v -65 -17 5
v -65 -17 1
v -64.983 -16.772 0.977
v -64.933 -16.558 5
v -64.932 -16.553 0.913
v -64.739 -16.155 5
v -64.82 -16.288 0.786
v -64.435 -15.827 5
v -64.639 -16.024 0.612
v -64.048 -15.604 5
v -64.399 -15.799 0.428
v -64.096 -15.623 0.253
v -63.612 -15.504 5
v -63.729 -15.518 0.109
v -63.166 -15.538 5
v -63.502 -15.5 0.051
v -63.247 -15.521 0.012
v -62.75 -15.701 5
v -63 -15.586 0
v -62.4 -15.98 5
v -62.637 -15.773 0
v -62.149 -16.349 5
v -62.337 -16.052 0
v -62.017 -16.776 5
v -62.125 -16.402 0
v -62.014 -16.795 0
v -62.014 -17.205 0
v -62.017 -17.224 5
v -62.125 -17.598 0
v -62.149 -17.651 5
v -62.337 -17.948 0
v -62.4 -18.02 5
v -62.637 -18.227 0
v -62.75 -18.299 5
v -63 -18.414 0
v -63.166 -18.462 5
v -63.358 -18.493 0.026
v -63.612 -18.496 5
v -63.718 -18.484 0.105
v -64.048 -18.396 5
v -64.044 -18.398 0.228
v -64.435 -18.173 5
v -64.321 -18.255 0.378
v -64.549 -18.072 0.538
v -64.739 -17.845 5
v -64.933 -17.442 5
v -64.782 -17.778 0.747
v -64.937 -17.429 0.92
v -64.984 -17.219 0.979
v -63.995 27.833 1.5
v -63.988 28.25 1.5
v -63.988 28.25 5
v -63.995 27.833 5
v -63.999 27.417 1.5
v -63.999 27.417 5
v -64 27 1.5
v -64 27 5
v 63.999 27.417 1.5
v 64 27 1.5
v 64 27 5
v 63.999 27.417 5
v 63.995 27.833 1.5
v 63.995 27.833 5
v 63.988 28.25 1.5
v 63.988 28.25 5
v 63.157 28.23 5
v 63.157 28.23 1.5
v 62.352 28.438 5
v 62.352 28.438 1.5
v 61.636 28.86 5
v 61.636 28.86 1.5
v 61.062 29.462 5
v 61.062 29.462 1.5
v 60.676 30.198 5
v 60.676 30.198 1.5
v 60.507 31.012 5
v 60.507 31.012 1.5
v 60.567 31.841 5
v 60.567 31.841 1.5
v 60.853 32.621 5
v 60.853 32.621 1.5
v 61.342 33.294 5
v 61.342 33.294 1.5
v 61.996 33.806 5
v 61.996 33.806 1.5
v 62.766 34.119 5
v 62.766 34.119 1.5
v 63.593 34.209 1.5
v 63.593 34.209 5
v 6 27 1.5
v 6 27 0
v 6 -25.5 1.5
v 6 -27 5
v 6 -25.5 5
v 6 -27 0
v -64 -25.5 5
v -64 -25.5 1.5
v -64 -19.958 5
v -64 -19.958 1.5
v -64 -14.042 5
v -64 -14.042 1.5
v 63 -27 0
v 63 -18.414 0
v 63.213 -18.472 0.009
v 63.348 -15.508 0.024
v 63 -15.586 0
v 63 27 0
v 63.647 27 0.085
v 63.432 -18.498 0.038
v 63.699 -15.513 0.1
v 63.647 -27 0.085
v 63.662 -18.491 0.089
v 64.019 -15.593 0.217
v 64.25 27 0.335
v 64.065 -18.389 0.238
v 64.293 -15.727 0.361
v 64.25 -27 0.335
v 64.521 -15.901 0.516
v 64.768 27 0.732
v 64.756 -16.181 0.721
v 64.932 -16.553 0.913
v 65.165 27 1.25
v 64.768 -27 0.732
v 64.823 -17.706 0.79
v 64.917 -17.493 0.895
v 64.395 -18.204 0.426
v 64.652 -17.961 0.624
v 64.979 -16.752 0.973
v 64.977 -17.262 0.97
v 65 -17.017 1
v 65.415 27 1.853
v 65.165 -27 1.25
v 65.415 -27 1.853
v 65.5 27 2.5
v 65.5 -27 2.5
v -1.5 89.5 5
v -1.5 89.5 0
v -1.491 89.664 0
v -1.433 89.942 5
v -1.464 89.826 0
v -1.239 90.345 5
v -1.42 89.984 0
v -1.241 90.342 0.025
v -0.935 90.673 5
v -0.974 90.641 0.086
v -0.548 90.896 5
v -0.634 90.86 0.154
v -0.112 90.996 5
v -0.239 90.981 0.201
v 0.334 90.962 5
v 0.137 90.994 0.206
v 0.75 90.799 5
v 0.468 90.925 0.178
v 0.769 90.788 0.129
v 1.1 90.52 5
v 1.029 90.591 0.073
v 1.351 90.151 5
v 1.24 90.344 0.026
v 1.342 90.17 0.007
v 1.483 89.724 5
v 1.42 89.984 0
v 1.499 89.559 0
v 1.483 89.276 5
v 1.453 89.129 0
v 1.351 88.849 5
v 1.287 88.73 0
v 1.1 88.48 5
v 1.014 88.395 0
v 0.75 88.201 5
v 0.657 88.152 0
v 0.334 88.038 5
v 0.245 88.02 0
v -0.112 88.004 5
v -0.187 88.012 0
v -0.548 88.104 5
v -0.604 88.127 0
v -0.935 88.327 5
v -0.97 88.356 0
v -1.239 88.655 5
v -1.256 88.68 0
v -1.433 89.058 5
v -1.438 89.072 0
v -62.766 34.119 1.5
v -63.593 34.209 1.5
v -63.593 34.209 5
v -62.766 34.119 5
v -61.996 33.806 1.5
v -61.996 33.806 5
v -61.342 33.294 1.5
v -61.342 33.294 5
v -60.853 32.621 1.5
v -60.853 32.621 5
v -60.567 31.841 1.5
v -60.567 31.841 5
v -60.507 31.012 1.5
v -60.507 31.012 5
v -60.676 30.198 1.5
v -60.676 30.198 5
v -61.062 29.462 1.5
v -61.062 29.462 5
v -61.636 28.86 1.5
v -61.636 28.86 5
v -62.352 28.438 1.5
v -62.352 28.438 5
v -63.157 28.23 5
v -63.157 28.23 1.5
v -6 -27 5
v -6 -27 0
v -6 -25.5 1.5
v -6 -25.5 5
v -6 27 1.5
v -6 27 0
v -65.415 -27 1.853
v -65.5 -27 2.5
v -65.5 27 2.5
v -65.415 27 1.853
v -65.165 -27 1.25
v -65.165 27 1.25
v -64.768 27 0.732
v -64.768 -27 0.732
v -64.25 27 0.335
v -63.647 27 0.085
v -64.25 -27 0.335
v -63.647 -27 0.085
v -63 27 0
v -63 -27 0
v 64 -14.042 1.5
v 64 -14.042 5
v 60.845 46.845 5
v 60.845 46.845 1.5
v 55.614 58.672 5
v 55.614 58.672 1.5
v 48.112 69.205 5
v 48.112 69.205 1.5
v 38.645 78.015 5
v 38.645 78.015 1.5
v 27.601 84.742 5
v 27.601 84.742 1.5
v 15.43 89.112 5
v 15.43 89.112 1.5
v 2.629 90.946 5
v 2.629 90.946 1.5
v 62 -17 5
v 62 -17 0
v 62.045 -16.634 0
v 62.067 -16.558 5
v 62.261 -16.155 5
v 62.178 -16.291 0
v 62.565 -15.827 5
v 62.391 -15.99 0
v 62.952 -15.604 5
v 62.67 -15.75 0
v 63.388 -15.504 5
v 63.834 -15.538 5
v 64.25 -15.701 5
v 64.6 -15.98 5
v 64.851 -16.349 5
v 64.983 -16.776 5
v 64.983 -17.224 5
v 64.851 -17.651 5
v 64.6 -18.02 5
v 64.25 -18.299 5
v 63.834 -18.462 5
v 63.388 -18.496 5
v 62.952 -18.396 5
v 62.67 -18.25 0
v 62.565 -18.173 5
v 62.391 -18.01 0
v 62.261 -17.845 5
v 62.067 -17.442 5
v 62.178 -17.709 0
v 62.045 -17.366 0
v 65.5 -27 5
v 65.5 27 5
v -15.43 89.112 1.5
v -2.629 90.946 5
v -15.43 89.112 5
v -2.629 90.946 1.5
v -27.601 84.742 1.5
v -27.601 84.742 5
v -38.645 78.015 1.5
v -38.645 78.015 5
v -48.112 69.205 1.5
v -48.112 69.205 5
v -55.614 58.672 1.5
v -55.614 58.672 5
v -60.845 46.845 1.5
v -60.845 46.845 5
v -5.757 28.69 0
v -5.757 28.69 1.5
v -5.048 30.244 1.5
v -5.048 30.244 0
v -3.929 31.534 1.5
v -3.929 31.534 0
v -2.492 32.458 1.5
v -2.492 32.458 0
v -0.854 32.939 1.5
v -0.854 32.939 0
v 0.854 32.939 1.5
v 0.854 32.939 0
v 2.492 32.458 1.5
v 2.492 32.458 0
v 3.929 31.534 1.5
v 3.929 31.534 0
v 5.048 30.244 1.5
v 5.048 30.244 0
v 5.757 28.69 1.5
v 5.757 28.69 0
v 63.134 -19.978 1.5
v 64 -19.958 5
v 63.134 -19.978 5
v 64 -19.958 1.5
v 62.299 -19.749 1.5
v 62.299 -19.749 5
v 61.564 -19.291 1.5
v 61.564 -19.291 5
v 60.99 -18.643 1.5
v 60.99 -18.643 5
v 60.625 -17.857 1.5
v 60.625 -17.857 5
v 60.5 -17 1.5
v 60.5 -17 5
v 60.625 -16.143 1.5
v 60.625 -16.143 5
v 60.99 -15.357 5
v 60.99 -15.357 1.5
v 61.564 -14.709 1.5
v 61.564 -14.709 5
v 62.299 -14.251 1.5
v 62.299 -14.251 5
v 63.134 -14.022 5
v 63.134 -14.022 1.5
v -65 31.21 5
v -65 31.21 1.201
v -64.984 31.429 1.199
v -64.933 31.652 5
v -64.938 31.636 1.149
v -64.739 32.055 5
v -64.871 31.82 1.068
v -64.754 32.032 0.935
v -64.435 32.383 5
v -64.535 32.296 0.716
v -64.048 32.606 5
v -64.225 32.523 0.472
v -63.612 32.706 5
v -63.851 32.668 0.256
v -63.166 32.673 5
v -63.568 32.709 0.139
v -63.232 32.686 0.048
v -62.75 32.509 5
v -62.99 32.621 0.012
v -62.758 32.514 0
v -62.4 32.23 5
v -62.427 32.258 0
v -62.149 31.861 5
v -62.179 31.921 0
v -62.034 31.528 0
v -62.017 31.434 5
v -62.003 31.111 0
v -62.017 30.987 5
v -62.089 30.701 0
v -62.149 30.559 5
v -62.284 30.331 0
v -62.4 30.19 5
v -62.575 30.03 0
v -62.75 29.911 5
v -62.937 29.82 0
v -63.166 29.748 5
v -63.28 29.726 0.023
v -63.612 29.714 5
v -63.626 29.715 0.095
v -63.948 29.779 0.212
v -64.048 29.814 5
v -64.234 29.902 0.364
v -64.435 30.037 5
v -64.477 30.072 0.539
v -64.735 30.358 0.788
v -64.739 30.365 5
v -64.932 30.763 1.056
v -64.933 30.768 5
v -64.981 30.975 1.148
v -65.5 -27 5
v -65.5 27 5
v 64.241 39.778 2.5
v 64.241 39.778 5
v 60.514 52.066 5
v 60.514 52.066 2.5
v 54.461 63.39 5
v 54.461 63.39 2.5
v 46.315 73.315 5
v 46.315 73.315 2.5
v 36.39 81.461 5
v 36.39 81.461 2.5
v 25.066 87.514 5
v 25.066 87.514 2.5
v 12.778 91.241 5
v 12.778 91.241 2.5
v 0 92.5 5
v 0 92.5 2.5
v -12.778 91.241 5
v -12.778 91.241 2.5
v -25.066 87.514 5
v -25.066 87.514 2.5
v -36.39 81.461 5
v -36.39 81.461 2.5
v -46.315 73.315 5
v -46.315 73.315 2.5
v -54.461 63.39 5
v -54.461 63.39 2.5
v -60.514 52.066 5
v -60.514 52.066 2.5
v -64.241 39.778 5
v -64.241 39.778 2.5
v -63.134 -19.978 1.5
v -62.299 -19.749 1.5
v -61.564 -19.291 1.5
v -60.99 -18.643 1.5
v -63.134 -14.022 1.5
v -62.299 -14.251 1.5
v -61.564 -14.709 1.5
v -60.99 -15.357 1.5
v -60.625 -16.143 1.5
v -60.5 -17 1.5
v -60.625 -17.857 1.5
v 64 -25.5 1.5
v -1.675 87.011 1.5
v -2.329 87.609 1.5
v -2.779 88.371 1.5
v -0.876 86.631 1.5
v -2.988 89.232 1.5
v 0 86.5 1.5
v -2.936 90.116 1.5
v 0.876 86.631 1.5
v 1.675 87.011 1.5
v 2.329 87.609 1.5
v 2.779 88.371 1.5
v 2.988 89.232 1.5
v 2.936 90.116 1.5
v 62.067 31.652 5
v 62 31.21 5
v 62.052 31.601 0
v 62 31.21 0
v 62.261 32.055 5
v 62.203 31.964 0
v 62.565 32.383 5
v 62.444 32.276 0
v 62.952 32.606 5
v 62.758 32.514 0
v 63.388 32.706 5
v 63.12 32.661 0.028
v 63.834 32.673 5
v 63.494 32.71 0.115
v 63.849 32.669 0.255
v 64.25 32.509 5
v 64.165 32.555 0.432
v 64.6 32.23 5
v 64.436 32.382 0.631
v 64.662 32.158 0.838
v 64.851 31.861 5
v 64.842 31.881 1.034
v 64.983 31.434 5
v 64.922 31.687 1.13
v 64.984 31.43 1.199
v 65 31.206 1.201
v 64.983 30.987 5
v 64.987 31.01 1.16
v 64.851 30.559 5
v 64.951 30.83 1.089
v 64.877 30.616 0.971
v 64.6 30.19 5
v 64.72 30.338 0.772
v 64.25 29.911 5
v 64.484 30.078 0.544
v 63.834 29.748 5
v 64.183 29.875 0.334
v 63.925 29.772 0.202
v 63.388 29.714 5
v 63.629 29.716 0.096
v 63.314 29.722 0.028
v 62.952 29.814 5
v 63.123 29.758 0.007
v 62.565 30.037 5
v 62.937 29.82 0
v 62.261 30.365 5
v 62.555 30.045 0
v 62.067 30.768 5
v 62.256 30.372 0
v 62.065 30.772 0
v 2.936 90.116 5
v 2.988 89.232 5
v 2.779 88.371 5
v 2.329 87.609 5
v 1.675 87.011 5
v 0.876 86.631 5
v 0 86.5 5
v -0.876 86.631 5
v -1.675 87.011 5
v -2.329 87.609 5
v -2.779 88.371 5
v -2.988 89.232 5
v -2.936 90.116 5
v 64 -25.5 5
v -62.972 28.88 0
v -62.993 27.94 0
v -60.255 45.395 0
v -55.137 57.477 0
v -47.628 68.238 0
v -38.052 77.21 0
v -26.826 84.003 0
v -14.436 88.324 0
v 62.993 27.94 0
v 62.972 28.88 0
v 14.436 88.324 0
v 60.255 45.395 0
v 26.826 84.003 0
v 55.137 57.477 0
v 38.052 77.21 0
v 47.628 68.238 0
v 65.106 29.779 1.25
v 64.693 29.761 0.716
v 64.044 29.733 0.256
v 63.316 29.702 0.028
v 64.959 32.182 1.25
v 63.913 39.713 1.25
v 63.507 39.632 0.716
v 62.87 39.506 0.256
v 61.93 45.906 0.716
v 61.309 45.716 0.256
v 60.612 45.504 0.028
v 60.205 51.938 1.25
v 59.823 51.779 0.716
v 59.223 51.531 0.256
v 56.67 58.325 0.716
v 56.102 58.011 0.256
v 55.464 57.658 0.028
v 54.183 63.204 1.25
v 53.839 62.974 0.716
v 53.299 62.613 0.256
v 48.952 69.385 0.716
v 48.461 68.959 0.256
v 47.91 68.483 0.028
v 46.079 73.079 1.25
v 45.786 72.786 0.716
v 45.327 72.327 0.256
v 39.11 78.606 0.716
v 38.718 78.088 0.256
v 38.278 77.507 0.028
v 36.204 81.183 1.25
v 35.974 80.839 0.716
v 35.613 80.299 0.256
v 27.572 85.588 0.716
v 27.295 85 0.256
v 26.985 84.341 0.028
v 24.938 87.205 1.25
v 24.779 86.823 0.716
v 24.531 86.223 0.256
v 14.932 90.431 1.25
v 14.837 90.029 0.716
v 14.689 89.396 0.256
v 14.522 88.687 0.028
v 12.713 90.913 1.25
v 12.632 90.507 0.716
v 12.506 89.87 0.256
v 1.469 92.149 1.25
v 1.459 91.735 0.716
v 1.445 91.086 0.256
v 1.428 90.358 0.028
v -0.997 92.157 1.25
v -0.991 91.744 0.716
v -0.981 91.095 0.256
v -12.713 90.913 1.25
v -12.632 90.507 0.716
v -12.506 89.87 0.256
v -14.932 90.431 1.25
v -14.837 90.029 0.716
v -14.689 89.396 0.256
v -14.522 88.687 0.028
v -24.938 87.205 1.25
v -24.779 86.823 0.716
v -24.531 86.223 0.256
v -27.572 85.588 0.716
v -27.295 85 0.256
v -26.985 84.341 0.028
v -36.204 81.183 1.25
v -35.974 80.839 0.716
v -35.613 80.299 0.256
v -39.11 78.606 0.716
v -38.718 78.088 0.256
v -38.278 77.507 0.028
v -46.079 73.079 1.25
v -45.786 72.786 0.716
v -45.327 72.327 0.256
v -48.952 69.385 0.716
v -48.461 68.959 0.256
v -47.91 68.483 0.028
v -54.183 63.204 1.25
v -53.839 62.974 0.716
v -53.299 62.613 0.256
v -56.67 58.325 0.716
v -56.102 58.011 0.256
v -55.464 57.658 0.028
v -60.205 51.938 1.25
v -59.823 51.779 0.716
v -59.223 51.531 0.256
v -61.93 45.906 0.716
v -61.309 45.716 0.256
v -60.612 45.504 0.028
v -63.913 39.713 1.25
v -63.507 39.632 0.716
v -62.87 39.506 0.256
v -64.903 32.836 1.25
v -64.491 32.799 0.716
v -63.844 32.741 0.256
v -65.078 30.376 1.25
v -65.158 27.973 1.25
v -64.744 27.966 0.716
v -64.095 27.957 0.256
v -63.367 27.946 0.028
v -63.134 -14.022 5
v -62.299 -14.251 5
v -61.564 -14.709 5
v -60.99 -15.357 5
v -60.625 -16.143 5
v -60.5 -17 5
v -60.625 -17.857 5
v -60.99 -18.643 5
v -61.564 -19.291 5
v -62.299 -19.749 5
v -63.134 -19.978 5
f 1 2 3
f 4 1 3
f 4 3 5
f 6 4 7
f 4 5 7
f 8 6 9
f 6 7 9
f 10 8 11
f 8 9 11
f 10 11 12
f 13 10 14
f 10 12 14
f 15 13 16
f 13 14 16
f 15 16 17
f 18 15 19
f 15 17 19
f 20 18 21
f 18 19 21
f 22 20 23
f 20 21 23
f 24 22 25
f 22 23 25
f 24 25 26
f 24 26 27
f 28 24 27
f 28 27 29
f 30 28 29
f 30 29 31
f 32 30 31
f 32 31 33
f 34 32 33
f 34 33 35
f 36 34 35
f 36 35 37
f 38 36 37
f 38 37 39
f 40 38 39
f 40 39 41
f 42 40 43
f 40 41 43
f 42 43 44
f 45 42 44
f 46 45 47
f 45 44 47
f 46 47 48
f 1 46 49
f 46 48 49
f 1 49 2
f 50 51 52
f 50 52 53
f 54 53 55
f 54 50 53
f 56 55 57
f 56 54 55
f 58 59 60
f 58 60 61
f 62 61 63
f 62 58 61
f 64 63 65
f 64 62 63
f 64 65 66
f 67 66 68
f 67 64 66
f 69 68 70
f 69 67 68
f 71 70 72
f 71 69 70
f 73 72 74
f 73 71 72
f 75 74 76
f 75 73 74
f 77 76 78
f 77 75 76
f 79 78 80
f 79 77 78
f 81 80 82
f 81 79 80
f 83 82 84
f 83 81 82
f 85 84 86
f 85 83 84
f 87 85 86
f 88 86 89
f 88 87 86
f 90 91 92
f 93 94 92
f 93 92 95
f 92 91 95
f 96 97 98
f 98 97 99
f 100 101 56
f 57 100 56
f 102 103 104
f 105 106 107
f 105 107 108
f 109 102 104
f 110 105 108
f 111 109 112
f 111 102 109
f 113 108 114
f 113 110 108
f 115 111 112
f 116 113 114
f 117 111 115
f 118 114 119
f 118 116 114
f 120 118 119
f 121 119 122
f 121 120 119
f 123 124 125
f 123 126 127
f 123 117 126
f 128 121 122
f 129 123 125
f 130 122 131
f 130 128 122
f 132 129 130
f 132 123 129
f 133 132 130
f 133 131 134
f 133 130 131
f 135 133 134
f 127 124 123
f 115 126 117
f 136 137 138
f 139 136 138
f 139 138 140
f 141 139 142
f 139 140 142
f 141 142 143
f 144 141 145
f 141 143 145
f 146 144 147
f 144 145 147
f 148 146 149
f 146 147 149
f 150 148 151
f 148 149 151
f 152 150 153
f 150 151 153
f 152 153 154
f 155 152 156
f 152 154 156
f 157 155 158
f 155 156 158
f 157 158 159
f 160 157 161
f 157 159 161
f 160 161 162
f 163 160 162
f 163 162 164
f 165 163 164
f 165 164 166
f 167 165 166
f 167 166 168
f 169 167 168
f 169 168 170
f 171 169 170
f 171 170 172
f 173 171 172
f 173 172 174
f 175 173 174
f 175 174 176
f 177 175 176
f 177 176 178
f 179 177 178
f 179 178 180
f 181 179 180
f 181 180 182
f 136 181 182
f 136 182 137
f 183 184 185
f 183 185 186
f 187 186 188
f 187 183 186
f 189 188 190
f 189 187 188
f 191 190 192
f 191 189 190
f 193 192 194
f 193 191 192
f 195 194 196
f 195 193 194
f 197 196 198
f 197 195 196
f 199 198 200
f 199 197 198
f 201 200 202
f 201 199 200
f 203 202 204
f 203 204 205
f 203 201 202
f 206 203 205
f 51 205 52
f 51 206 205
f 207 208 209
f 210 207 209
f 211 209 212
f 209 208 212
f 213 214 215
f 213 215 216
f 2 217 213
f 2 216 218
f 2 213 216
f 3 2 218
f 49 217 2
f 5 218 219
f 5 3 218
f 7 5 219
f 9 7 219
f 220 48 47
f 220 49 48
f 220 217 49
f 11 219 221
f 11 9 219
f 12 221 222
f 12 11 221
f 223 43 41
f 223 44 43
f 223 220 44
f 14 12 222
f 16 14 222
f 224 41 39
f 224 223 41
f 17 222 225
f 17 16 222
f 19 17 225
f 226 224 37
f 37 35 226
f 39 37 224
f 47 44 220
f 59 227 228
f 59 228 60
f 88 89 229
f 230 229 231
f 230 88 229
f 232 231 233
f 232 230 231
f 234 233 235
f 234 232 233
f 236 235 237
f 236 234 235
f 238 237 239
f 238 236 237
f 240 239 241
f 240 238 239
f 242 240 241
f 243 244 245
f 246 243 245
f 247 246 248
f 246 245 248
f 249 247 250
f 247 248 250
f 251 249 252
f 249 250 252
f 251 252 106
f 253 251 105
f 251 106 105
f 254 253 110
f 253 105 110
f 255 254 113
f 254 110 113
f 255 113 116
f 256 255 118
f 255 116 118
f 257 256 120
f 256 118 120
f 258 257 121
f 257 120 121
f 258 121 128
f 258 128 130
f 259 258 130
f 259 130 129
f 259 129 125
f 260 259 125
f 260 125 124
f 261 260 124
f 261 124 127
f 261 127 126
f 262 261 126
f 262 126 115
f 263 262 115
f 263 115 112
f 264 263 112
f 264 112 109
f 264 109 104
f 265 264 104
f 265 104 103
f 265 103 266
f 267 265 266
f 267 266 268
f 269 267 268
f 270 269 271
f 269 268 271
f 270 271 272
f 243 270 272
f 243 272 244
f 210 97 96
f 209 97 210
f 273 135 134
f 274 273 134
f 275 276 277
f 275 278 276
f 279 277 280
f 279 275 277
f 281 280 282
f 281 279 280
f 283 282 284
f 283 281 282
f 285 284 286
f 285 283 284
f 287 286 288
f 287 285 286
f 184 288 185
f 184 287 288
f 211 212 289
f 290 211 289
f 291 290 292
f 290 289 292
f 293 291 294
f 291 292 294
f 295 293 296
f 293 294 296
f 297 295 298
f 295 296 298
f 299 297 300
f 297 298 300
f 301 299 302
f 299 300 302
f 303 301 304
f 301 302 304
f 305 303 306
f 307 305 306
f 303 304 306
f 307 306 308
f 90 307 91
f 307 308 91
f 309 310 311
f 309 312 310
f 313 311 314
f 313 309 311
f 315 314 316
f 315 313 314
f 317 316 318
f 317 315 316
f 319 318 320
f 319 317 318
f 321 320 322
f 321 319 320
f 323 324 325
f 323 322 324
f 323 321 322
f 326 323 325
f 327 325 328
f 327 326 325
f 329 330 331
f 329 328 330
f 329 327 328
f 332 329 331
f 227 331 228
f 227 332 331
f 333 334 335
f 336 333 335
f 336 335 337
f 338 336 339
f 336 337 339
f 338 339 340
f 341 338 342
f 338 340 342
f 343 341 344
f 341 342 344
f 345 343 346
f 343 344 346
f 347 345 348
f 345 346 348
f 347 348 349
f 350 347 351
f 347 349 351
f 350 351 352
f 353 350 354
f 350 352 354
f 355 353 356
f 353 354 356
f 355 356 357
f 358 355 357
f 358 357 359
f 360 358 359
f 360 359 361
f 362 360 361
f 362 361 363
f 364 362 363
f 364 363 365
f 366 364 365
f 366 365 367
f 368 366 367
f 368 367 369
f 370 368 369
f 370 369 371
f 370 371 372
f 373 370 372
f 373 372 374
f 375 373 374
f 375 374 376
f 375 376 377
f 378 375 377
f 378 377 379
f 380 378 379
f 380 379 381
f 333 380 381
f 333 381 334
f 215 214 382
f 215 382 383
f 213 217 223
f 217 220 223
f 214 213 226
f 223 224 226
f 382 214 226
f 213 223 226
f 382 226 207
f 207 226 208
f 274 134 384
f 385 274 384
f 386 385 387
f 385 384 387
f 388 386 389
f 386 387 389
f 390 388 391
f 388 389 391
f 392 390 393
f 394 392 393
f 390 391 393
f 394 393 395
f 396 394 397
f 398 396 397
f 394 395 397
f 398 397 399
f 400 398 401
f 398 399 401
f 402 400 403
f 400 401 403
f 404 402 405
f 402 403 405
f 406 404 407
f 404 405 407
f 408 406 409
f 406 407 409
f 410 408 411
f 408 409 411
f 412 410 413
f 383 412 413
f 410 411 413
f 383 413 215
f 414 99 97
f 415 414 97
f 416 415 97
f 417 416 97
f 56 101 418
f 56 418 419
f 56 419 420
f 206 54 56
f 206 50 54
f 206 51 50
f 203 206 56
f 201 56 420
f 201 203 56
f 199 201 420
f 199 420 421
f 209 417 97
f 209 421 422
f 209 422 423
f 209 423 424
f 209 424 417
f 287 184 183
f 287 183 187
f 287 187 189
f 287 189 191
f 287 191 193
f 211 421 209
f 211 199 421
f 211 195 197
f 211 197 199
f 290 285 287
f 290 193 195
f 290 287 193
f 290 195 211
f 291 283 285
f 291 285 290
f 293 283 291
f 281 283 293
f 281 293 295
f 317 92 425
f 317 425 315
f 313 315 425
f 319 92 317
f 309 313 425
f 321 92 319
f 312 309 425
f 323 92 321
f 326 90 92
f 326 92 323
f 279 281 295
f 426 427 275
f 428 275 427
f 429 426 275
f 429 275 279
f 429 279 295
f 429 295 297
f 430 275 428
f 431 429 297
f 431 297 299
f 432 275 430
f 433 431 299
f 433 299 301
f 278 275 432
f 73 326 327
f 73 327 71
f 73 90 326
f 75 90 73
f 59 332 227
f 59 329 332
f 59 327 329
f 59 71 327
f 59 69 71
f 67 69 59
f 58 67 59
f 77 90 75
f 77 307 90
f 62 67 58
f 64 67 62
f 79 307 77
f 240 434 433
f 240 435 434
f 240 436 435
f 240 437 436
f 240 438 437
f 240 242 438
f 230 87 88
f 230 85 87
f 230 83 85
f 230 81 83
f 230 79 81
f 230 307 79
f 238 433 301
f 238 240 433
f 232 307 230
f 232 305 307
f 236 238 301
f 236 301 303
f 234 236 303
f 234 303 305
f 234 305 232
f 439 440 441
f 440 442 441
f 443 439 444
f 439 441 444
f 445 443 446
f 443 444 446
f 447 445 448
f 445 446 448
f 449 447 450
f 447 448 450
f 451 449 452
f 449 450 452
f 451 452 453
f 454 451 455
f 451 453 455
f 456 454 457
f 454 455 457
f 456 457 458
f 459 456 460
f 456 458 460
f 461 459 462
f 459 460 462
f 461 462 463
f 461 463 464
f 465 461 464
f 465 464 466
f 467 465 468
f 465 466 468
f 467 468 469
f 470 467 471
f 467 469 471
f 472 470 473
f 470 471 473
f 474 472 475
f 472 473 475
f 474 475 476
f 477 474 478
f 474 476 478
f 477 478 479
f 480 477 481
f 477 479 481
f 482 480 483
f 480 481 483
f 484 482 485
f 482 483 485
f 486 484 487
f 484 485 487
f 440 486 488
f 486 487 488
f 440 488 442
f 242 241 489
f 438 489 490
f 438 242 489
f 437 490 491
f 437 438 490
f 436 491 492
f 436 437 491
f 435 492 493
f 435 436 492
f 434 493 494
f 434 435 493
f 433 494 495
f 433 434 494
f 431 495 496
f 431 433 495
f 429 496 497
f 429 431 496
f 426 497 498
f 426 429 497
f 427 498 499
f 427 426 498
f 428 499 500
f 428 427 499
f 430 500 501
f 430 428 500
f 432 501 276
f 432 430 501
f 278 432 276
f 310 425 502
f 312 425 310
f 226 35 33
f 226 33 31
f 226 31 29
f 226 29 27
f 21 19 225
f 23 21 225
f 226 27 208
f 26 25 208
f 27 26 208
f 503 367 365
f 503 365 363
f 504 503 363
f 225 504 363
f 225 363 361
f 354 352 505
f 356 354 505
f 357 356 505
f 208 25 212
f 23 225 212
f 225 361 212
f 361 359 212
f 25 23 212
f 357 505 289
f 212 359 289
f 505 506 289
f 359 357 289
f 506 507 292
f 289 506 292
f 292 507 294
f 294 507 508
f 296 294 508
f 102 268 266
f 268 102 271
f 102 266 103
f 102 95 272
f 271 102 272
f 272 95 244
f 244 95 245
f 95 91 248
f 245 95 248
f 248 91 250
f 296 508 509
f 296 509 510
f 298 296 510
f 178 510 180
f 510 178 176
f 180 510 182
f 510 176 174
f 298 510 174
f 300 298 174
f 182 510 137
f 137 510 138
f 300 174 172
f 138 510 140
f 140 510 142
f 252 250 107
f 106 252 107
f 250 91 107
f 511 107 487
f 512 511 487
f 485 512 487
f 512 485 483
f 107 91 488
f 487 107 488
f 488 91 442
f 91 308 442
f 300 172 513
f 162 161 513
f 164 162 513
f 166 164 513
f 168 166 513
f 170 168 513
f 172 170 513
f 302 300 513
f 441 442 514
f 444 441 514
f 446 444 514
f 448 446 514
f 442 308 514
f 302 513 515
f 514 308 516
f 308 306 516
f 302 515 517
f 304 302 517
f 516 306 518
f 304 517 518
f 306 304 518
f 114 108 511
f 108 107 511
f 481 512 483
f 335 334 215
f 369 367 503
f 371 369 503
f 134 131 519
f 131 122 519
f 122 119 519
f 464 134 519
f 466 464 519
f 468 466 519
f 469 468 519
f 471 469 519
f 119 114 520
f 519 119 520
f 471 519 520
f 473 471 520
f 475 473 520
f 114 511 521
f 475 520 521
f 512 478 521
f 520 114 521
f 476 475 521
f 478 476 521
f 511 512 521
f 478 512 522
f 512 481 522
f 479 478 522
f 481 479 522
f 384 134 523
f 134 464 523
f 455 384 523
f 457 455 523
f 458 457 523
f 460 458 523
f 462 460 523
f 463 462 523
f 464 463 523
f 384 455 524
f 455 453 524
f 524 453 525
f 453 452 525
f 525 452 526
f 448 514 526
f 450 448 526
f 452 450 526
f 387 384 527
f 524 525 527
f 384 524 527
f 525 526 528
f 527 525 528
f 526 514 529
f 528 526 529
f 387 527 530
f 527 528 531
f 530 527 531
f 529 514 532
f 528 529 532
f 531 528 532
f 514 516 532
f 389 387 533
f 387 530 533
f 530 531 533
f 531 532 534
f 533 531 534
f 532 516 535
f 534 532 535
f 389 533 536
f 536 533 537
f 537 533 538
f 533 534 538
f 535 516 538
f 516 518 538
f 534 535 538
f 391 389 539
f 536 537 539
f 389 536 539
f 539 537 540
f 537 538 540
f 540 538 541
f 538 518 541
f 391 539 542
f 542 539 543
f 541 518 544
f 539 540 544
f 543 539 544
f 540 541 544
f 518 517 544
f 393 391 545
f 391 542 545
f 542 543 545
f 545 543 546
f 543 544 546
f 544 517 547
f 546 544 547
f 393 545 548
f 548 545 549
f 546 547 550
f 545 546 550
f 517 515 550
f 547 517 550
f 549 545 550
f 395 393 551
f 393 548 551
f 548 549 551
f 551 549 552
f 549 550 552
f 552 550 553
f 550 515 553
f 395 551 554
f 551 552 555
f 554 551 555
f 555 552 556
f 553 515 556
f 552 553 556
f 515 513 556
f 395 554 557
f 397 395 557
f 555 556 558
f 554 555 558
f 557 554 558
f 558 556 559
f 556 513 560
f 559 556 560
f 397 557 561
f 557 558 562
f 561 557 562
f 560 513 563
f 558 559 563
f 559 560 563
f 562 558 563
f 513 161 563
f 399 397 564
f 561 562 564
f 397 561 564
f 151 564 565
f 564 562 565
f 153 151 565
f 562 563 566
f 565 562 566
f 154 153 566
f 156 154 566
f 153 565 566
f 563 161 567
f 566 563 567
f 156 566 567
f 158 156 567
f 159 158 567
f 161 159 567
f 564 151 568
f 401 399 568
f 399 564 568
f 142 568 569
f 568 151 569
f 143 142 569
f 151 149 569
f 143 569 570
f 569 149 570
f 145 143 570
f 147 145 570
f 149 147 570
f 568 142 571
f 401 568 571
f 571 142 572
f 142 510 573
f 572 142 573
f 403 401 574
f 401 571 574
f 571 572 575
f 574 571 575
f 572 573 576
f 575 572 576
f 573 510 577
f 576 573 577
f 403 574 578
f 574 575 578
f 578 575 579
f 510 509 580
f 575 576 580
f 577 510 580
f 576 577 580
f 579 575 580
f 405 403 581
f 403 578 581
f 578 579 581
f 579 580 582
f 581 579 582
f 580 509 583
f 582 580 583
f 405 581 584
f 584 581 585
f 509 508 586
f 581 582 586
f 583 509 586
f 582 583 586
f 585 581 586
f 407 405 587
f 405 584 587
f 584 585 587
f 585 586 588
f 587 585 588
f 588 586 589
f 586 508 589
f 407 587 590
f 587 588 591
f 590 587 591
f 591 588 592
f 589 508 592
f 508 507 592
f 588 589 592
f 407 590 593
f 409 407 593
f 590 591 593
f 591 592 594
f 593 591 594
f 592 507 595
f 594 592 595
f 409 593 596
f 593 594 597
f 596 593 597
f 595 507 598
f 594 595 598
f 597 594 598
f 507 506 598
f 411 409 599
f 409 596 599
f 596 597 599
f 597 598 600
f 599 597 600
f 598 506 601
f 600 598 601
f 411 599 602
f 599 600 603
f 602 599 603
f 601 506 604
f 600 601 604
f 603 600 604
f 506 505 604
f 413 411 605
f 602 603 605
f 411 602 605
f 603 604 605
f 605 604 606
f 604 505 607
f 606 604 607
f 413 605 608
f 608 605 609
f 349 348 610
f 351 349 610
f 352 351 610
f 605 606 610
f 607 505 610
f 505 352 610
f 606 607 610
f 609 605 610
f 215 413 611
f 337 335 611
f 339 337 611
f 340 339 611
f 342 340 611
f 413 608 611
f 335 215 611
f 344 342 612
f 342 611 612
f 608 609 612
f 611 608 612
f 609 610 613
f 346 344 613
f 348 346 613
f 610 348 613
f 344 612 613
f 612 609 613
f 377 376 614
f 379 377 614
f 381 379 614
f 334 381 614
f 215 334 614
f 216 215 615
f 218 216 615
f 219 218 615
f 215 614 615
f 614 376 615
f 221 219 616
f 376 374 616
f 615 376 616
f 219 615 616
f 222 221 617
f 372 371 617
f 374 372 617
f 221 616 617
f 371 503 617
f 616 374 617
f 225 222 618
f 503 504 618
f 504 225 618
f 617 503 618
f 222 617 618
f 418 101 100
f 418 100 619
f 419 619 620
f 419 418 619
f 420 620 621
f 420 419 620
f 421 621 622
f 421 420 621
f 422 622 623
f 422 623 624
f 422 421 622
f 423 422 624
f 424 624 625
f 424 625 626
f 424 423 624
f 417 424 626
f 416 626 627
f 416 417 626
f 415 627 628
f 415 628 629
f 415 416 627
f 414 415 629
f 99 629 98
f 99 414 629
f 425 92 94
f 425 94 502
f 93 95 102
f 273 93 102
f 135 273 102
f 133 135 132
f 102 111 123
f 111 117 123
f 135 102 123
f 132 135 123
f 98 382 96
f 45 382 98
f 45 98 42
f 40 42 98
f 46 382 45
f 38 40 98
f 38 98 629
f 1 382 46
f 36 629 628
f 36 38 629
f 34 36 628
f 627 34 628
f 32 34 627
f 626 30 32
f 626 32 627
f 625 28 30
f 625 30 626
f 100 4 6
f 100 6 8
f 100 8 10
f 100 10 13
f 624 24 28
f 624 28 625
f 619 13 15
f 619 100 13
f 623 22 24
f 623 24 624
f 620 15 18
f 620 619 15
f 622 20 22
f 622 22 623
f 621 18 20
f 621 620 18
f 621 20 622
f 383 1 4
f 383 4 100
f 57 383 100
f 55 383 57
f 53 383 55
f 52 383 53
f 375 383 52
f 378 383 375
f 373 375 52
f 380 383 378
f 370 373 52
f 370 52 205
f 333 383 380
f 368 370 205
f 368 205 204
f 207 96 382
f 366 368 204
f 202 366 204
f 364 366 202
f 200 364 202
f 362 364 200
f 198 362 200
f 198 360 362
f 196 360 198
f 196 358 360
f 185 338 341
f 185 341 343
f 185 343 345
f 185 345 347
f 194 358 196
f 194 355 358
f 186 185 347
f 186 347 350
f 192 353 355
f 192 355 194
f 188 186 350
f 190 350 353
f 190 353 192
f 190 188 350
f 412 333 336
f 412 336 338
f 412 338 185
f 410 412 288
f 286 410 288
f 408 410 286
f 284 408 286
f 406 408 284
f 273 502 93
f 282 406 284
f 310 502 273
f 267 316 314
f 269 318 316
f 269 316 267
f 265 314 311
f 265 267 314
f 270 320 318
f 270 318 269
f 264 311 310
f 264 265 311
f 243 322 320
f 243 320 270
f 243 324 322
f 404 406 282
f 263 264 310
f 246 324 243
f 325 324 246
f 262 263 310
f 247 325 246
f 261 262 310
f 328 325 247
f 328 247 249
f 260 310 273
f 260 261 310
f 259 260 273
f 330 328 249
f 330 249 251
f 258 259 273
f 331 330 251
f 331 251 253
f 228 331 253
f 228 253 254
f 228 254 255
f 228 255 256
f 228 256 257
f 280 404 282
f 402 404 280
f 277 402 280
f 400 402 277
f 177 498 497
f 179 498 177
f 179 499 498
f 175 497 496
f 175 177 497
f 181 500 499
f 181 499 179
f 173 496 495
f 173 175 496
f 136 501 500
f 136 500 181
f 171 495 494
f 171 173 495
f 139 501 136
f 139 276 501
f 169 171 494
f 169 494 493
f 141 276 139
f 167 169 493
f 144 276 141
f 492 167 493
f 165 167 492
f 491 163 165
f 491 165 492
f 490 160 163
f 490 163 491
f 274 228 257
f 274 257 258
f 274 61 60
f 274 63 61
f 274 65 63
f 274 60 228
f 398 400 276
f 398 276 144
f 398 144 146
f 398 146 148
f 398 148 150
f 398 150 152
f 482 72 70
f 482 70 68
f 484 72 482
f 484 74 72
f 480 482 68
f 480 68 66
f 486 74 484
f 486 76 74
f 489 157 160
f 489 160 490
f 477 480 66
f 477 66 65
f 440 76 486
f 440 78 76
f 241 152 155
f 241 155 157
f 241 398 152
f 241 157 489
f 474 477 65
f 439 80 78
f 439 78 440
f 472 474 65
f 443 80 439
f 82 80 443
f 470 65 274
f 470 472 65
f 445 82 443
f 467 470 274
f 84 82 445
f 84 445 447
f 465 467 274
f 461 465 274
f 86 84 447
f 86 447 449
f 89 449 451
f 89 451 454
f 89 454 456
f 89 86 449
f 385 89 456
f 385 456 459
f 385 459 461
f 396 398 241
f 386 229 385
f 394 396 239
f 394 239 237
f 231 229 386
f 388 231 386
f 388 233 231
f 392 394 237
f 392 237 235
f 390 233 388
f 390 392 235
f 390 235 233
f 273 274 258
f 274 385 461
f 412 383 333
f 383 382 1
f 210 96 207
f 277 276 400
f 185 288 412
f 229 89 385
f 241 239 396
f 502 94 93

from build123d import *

# Parameters (mm, degrees)
SKETCH3_W                    = 131
SKETCH3_H                    = 54
BOSS_EXTRUDE2_DEPTH          = 5
F_3_0_3_DIAMETER_HOLE1_D     = 3
F_3_0_3_DIAMETER_HOLE1_DEPTH = 20
F_3_0_3_DIAMETER_HOLE1_TIP   = 0.901290929
SHELL1_T                     = -1.5
CUT_EXTRUDE1_DEPTH           = 114.452633288
FILLET2_START                = -28
FILLET2_DEPTH                = 120.497573337
FILLET2_2_ANGLE              = 180


with BuildPart() as part:
    # Sketch3 → Boss-Extrude2 (new body)
    with BuildSketch(Plane.XY):
        with BuildLine():
            Line((-65.5, 27), (65.5, 27))
            ThreePointArc((65.5, 27), (0, 92.5), (-65.5, 27))
        make_face()
        Rectangle(SKETCH3_W, SKETCH3_H)
    extrude(amount=BOSS_EXTRUDE2_DEPTH)

    # Ø3.0 (3) Diameter Hole1
    with Locations(Plane.XY.offset(5)):
        with Locations((-63.5, -17), (63.5, -17), (0, 89.5), (63.5, 31.210132452), (-63.5, 31.210132452)):
            Hole(F_3_0_3_DIAMETER_HOLE1_D / 2, depth=F_3_0_3_DIAMETER_HOLE1_DEPTH)
            with Locations((0, 0, -(F_3_0_3_DIAMETER_HOLE1_DEPTH + F_3_0_3_DIAMETER_HOLE1_TIP / 2))):  # 118° drill point
                Cone(0, F_3_0_3_DIAMETER_HOLE1_D / 2, F_3_0_3_DIAMETER_HOLE1_TIP, mode=Mode.SUBTRACT)

    # Shell1
    shell1_openings = [part.faces().sort_by_distance(p)[0] for p in [
        (0, 26.743328941, 5),
    ]]
    offset(amount=SHELL1_T, openings=shell1_openings)

    # Sketch6 → Cut-Extrude1 (cut, through all)
    with BuildSketch(Plane(origin=(0, 0, 0), x_dir=(-1, 0, 0), z_dir=(0, 0, -1))):
        with BuildLine():
            Line((-6, 27), (-6, -27))
            Line((-6, -27), (6, -27))
            Line((6, -27), (6, 27))
            ThreePointArc((6, 27), (0, 33), (-6, 27))
        make_face()
    extrude(amount=-CUT_EXTRUDE1_DEPTH, mode=Mode.SUBTRACT)

    # Fillet2: read off the stored shape, not the designer's step
    # Fillet2 outline → Fillet2 (cut)
    with BuildSketch(Plane(origin=(0, 0, 0), x_dir=(1, 0, 0), z_dir=(0, 1, 0)).offset(FILLET2_START)):
        with BuildLine():
            ThreePointArc((-65.5, -2.5), (-64.767766953, -0.732233047), (-63, 0))
            Line((-63, 0), (-65.5, 0))
            Line((-65.5, 0), (-65.5, -2.5))
        make_face()
        with BuildLine():
            ThreePointArc((63, 0), (64.767766953, -0.732233047), (65.5, -2.5))
            Line((65.5, -2.5), (65.5, 0))
            Line((65.5, 0), (63, 0))
        make_face()
    extrude(amount=FILLET2_DEPTH, mode=Mode.SUBTRACT)

    # Fillet2 2 outline → Fillet2 2 (revolve, cut)
    with BuildSketch(Plane.XZ.offset(-27)):
        with BuildLine():
            ThreePointArc((65.5, 2.5), (64.767766953, 0.732233047), (63, 0))
            Line((63, 0), (65.5, 0))
            Line((65.5, 0), (65.5, 2.5))
        make_face()
    revolve(axis=Axis((0, 27, 0), (0, 0, 1)), revolution_arc=FILLET2_2_ANGLE, mode=Mode.SUBTRACT)


solid = part.part
